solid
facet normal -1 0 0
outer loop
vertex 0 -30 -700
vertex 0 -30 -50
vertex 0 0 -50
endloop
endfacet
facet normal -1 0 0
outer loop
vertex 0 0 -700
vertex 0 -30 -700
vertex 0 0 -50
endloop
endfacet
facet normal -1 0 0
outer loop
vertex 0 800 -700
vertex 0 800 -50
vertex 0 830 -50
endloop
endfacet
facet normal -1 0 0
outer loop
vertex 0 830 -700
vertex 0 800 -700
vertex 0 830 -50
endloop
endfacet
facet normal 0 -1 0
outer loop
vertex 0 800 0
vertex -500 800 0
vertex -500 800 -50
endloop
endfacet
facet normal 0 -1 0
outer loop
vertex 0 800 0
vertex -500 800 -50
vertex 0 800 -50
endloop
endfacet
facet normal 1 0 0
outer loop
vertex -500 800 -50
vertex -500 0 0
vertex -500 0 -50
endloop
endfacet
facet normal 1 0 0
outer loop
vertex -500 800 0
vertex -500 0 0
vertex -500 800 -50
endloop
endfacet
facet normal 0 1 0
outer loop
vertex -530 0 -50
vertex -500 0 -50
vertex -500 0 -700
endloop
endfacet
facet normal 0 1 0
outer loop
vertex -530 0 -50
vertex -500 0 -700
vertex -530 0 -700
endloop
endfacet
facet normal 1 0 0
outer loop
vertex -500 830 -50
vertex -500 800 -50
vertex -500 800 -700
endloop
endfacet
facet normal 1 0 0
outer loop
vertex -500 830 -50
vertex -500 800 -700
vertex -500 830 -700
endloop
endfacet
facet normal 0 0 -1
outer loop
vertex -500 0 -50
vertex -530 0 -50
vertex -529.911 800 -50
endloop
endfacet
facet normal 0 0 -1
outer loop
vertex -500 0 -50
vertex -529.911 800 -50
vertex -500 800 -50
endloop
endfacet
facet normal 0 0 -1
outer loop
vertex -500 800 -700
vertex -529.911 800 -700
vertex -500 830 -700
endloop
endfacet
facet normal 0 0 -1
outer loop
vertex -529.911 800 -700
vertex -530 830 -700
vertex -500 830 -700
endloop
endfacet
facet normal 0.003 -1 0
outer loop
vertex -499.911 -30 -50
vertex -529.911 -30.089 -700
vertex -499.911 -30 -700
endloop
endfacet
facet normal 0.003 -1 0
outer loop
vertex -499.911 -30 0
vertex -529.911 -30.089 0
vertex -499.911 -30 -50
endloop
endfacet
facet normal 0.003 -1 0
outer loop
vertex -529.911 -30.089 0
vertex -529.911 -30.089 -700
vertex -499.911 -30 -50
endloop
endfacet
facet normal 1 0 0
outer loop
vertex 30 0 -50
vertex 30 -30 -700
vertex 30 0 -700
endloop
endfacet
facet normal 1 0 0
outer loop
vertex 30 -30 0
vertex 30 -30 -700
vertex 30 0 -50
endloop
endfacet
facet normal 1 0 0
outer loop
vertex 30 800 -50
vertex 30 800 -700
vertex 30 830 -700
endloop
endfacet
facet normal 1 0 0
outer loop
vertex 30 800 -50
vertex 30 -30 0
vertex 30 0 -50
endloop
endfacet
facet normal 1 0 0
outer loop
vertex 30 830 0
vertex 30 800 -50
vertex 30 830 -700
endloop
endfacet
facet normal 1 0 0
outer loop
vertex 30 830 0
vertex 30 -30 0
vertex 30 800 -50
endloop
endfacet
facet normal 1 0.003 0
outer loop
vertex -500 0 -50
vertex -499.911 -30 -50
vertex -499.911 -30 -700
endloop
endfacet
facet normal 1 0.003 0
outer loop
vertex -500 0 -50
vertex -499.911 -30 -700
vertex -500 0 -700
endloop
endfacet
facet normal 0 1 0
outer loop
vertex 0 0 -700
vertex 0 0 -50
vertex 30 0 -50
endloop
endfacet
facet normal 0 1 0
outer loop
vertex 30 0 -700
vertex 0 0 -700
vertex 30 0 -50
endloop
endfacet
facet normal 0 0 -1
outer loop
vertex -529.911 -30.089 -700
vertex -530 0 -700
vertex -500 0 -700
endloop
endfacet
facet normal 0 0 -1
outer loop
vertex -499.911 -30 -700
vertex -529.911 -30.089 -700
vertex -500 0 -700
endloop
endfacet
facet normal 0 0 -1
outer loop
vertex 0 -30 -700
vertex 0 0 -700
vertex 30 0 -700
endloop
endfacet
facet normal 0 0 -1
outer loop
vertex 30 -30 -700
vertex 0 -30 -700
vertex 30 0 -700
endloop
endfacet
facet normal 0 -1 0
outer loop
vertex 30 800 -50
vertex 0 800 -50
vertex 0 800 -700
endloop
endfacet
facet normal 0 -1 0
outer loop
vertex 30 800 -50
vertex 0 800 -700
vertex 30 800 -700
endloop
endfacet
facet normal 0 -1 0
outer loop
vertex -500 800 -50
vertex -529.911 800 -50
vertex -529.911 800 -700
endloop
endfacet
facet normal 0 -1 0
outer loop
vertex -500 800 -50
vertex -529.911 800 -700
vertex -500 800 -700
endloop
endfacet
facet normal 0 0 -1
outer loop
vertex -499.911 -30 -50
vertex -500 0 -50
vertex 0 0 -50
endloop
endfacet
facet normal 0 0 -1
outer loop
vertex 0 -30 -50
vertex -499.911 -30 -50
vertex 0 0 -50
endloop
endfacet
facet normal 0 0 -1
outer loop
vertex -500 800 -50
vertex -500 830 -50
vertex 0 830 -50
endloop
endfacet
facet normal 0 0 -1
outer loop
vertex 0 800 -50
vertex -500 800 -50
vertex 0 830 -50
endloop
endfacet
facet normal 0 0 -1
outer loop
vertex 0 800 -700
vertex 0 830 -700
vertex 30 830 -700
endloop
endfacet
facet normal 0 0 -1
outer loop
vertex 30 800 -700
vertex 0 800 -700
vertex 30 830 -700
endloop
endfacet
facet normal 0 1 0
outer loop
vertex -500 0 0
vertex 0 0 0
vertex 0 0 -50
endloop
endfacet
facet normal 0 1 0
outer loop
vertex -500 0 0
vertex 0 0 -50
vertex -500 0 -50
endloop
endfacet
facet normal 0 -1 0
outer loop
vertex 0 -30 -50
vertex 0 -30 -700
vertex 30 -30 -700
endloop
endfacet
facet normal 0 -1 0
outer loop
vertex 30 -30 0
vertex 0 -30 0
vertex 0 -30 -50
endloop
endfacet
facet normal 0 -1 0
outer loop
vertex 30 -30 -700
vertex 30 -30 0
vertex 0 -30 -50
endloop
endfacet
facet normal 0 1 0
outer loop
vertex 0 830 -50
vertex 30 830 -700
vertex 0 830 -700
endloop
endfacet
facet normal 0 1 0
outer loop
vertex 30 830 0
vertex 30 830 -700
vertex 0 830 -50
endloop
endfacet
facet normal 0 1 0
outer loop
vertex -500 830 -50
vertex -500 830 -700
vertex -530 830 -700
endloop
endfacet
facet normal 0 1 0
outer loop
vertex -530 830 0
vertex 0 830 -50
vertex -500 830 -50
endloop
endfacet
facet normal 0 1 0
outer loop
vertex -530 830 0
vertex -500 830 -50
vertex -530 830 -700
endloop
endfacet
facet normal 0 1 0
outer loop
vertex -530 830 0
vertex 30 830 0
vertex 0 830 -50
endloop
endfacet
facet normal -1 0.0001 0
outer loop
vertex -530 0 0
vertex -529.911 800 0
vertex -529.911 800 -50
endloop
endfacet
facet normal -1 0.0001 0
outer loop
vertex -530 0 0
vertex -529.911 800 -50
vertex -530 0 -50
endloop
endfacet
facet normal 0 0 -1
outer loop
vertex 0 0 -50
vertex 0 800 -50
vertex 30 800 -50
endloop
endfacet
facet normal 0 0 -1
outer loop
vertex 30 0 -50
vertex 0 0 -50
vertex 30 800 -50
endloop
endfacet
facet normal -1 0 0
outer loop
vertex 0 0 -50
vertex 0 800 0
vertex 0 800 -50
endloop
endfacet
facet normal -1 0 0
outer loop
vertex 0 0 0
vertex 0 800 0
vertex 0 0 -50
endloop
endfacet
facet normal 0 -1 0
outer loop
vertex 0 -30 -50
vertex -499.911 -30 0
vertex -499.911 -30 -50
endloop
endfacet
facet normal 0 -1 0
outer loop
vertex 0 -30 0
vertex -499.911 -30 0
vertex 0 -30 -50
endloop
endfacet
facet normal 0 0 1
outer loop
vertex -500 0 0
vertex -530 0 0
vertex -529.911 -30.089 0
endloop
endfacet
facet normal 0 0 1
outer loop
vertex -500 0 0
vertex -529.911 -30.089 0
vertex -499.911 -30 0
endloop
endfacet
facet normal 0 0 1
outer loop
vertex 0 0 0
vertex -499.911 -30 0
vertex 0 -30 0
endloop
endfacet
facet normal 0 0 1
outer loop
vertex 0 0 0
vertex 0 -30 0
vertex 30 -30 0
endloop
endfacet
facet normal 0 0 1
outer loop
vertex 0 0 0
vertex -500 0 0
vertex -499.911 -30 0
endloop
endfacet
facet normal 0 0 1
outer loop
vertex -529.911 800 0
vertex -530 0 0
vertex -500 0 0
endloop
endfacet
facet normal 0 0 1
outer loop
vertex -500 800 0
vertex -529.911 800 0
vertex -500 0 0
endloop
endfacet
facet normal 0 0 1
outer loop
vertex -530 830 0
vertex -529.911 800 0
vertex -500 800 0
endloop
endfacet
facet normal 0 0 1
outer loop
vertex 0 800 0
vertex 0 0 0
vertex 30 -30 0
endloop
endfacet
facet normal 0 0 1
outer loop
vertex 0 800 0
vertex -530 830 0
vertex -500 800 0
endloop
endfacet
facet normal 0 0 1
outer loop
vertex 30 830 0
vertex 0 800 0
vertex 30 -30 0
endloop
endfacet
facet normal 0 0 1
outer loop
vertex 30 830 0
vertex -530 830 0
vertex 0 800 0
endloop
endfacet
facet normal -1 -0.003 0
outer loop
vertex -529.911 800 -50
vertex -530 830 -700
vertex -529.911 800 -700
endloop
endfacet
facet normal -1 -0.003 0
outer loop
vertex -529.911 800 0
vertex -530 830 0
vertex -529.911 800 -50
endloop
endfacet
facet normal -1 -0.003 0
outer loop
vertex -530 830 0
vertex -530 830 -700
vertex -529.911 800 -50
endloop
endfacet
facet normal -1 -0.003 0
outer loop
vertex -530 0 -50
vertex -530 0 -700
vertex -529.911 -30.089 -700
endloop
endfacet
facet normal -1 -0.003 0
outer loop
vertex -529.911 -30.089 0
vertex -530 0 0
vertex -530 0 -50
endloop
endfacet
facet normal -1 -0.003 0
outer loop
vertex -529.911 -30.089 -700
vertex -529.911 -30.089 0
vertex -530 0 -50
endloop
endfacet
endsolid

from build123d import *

# Parameters (mm, degrees)
F0_W     = 500
F0_H     = 30
F0_W_2   = 30
F0_H_2   = 800
F1_DEPTH = 50
F2_DEPTH = 700


with BuildPart() as f1:
    # F0 (on Top) → F1 (new body)
    with BuildSketch(Plane.XY):
        Polygon((-530.000132, 0), (-500, 0), (-500, 800), (-529.910707, 800), align=None)
        Polygon((-529.910707, 800), (-500, 800), (-500, 830), (-529.999868, 830), align=None)
        with Locations((-250, 815)):
            Rectangle(F0_W, F0_H)
        with Locations((15, 815)):
            Rectangle(F0_W_2, F0_H)
        with Locations((15, 400)):
            Rectangle(F0_W_2, F0_H_2)
        with Locations((15, -15)):
            Rectangle(F0_W_2, F0_H)
        Polygon((0, -30), (0, 0), (-500, 0), (-499.91084, -29.999868), align=None)
        Polygon((-499.91084, -29.999868), (-500, 0), (-530.000132, 0), (-529.910707, -30.089028), align=None)
    extrude(amount=-F1_DEPTH)

    # F0 (on Top) → F2 (join)
    with BuildSketch(Plane.XY):
        with Locations((15, -15)):
            Rectangle(F0_W_2, F0_H)
        Polygon((-499.91084, -29.999868), (-500, 0), (-530.000132, 0), (-529.910707, -30.089028), align=None)
        Polygon((-529.910707, 800), (-500, 800), (-500, 830), (-529.999868, 830), align=None)
        with Locations((15, 815)):
            Rectangle(F0_W_2, F0_H)
    extrude(amount=-F2_DEPTH)


solid = f1.part
